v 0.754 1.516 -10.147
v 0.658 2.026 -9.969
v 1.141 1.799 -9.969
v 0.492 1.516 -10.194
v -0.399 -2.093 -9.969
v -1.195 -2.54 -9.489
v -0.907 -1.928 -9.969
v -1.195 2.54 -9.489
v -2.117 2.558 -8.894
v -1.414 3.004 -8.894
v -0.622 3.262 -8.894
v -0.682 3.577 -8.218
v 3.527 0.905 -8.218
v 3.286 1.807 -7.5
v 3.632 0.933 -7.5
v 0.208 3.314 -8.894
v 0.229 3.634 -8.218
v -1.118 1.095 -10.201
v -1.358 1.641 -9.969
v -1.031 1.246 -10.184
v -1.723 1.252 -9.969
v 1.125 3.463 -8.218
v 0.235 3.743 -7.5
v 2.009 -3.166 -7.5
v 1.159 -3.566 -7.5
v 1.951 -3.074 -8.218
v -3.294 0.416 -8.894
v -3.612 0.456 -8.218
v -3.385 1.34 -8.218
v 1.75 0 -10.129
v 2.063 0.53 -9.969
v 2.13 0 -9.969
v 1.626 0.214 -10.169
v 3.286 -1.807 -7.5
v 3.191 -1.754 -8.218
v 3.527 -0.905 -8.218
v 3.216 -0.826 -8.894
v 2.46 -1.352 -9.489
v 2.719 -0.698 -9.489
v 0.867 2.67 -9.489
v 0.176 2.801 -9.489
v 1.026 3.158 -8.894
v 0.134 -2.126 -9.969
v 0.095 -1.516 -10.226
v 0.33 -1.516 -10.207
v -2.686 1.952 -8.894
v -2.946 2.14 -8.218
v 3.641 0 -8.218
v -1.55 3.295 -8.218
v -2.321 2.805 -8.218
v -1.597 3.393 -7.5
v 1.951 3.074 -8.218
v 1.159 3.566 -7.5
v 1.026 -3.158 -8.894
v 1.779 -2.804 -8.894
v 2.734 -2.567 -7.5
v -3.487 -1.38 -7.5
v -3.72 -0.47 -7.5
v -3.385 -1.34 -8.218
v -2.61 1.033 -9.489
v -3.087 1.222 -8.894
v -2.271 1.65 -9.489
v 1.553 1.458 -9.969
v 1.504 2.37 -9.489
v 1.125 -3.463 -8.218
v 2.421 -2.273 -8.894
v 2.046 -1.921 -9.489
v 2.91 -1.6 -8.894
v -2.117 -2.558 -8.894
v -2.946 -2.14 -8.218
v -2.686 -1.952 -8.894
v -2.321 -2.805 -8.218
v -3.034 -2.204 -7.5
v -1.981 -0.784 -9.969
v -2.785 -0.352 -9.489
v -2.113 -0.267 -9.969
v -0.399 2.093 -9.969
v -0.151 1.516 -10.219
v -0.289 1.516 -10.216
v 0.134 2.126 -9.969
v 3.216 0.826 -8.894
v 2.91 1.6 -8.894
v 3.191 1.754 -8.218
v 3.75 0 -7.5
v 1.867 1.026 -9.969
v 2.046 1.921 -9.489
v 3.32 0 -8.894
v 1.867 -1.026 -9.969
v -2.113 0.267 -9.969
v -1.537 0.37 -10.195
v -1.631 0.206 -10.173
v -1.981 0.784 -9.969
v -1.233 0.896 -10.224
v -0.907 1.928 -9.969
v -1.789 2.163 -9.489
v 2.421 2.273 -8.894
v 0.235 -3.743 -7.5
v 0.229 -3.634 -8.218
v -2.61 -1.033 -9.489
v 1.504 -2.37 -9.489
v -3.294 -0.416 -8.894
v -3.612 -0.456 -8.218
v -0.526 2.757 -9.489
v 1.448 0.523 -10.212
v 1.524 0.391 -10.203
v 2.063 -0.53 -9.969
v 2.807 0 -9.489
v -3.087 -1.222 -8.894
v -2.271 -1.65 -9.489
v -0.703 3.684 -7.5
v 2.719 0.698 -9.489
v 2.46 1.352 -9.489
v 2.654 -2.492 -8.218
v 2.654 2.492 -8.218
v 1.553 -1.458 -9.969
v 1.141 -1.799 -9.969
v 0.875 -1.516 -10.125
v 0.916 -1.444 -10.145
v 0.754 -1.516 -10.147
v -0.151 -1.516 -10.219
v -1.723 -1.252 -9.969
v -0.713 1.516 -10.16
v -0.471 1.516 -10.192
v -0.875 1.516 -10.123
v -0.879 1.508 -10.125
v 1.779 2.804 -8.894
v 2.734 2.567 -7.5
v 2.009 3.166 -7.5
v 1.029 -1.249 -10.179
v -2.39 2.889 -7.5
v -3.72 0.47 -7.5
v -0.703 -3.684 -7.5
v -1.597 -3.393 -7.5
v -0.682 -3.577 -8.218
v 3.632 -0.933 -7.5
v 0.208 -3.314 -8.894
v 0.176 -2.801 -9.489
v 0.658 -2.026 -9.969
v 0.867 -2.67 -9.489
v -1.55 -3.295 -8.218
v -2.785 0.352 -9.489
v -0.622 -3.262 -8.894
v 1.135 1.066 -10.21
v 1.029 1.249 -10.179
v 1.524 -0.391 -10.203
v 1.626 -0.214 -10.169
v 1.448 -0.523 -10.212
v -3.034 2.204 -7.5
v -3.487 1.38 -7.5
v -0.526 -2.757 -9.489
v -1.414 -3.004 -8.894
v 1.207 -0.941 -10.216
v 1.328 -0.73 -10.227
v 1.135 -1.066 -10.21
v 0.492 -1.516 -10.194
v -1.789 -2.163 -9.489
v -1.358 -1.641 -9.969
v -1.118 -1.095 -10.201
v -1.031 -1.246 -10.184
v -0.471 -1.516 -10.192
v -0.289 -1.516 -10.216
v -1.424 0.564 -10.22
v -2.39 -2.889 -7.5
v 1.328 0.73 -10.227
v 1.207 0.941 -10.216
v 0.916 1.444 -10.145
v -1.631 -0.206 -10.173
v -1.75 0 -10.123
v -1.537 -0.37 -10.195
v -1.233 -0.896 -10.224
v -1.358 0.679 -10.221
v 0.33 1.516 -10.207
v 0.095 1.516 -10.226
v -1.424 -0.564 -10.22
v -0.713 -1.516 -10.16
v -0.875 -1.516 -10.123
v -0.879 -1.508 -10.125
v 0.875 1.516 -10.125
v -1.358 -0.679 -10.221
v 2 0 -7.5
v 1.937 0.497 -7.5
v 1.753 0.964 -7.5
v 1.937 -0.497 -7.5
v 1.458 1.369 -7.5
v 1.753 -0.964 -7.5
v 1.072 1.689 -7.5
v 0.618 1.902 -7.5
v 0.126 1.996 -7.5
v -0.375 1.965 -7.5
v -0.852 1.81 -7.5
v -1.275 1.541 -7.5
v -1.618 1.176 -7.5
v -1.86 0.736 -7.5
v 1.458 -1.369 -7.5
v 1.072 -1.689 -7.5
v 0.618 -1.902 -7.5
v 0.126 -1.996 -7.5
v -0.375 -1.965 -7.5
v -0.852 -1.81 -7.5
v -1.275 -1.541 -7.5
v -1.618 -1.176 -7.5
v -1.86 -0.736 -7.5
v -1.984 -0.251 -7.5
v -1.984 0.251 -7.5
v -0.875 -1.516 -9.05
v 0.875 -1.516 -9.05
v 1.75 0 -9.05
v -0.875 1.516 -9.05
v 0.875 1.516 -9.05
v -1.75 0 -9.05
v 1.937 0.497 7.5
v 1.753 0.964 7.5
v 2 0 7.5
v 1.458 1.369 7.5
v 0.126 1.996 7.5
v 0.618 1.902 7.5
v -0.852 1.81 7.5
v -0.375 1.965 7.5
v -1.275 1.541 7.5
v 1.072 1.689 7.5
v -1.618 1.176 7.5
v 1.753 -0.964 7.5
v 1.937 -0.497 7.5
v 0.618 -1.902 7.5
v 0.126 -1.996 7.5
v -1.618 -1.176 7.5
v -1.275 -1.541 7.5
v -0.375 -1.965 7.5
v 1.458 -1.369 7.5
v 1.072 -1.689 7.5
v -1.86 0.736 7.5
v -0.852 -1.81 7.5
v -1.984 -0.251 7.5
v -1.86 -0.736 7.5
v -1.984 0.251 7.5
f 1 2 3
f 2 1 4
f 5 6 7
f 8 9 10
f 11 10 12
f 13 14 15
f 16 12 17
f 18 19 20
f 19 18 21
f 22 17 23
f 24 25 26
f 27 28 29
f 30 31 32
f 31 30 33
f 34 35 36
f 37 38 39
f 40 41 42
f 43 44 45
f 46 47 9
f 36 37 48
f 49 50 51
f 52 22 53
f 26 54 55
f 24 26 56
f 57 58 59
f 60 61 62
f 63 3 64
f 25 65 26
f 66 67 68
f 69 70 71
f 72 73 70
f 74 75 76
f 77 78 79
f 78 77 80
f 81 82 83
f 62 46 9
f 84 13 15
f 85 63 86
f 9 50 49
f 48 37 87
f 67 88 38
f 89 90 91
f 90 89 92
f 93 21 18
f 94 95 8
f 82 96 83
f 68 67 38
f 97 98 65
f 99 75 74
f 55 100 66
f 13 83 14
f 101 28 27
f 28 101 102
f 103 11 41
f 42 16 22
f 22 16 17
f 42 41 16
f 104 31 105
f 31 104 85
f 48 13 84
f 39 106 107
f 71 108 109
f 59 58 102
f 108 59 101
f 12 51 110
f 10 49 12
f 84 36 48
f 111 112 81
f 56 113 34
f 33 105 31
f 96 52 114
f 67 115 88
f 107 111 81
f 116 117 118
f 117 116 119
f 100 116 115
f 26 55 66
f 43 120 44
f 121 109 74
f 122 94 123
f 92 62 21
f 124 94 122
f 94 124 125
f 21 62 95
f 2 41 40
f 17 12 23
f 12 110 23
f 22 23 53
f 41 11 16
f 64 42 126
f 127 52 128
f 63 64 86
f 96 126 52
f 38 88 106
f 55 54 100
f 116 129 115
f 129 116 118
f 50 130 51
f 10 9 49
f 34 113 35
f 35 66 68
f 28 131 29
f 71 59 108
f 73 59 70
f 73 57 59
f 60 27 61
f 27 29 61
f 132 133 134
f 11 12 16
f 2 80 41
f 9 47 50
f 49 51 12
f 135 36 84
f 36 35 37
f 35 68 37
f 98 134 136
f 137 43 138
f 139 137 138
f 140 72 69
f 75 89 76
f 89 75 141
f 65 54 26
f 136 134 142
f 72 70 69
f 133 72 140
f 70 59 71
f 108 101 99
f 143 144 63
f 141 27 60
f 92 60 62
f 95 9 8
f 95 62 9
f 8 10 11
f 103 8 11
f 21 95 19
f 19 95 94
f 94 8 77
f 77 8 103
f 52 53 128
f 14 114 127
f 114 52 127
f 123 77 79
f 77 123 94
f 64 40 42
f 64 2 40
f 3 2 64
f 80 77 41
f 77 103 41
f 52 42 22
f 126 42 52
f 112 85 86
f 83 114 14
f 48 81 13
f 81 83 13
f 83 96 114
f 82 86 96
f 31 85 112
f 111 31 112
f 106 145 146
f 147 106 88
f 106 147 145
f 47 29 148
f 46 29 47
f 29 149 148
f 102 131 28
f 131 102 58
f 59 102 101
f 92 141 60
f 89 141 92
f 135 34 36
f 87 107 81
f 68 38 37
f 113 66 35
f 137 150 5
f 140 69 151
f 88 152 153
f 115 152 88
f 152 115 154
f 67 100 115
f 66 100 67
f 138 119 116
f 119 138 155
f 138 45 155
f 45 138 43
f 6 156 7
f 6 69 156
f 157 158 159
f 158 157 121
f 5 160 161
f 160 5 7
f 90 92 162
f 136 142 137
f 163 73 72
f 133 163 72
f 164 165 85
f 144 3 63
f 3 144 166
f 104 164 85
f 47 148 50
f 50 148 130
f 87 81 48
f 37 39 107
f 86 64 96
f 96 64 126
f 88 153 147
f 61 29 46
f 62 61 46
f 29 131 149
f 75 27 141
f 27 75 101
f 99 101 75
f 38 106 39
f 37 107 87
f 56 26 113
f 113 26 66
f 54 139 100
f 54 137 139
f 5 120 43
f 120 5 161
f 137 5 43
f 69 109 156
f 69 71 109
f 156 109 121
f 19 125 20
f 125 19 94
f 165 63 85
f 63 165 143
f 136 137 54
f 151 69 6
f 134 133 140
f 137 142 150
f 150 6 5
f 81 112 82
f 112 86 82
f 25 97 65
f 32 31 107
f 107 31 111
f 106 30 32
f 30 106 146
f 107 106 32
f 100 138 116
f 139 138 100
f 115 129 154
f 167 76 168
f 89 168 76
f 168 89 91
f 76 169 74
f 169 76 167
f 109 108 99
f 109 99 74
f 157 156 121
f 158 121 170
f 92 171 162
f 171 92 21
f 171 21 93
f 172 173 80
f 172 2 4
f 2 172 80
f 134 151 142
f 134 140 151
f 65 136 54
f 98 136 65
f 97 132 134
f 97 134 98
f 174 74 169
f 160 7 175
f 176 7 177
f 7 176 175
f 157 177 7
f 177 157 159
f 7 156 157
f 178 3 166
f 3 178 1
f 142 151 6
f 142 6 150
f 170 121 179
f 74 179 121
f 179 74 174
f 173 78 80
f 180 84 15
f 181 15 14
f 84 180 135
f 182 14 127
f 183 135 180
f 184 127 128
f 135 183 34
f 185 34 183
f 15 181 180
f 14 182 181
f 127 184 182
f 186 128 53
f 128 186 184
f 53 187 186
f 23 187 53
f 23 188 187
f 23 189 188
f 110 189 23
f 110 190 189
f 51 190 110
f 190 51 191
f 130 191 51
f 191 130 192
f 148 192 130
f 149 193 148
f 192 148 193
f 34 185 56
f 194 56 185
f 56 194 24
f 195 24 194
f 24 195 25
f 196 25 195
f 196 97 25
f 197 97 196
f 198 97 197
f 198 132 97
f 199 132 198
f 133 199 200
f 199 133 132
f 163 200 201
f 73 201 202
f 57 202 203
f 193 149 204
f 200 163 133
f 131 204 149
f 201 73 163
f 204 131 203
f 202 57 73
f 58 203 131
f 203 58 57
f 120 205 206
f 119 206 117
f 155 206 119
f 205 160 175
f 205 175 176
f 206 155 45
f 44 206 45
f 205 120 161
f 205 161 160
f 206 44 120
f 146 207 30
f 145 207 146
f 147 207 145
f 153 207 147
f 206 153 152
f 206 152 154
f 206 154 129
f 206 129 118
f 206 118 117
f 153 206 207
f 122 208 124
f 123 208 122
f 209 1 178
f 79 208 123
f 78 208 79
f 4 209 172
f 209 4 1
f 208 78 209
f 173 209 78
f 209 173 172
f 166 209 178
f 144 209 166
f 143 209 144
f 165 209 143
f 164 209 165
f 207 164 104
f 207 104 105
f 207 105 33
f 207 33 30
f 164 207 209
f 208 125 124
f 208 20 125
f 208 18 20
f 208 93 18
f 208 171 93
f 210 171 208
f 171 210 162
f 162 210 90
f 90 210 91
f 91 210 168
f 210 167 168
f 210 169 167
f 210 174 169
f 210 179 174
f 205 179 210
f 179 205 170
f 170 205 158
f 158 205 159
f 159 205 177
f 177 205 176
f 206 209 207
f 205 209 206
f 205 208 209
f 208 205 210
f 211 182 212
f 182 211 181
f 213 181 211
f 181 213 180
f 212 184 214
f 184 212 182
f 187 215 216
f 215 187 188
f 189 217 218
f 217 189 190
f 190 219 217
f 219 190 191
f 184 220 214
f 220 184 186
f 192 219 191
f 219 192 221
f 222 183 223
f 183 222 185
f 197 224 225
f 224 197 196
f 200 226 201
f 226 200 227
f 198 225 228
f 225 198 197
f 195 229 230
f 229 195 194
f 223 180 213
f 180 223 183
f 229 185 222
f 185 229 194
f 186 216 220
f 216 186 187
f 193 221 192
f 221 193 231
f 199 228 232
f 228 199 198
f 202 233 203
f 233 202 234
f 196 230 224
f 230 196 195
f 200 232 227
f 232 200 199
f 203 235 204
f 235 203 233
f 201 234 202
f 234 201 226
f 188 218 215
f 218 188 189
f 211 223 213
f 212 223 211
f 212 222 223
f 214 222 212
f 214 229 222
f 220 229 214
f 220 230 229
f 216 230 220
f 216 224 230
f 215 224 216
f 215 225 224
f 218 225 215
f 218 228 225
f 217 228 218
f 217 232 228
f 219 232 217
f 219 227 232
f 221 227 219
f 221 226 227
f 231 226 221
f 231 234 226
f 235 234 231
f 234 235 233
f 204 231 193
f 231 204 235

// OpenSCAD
// file: lib/screw_nuts.scad
$fn=25;

module screw_m3(h=20, button=false){
    cylinder(d=3, h=h, center=true);
    translate([0, 0, -h/2-1.5])
        difference(){
            cylinder(d=5.5, h=3, center=true);
            translate([0, 0, -0.8])
                cylinder(d=2.8, h=1.8, $fn=6, center=true);
        }
}

module screw_m4(h=20, button=false){
    cylinder(d=4, h=h, center=true);
    translate([0, 0, -h/2-2])
        difference(){
            if (button) {
                translate([0, 0, 2])
                    scale([1, 1, 6/7.5])
                    sphere(d=7.5);
            } else {
                cylinder(d=7, h=4, center=true);
            }
            if (button) {
                 translate([0, 0, 5])
                    cube([7.6, 7.6, 6], center=true);
            }
            translate([0, 0, -0.8])
                cylinder(d=3.5, h=2.5, $fn=6, center=true);
        }
}

module nut_m3(){
    difference(){
        cylinder(d=6, h=2.4, $fn=6);
        translate([0, 0, -0.05])
            cylinder(d=3, h=2.5);
    }
}

module nut_m4(){
    difference(){
        cylinder(d=7.6, h=3.2, $fn=6);
        translate([0, 0, -0.05])
            cylinder(d=4, h=3.3);
    }
}

module washer_m3(h){
    difference(){
        cylinder(d=8, h=h, center=true);
        cylinder(d=3.4, h=h+0.1, center=true);
    }
}

module washer_m5(h){
    difference(){
        cylinder(d=8, h=h, center=true);
        cylinder(d=5.4, h=h+0.1, center=true);
    }
}
// main file
// NAME: Screw M4x15 Button
// COLOR: 80
// CATEGORY: Support

include <lib/screw_nuts.scad>

color("silver")
    screw_m4(15, true);
